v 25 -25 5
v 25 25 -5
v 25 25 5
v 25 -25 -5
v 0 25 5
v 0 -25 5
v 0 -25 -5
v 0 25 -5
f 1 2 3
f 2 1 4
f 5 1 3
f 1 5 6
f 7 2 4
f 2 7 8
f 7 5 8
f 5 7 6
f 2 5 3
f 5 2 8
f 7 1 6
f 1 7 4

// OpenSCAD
$fn = 150;

height = 10.0;
width = 50.0;

wireCircleOffset = width / 2.0 + (height / 6.0 * 4.0);

wireDia = height *10.0 / 6.0; 


difference()
{
	translate([0, -width/2, -height/2]) cube([width/2, width, height]);
	rotate_extrude() translate([wireCircleOffset, 0, 0]) rotate([90, 0, 0]) circle(r=wireDia);
}
